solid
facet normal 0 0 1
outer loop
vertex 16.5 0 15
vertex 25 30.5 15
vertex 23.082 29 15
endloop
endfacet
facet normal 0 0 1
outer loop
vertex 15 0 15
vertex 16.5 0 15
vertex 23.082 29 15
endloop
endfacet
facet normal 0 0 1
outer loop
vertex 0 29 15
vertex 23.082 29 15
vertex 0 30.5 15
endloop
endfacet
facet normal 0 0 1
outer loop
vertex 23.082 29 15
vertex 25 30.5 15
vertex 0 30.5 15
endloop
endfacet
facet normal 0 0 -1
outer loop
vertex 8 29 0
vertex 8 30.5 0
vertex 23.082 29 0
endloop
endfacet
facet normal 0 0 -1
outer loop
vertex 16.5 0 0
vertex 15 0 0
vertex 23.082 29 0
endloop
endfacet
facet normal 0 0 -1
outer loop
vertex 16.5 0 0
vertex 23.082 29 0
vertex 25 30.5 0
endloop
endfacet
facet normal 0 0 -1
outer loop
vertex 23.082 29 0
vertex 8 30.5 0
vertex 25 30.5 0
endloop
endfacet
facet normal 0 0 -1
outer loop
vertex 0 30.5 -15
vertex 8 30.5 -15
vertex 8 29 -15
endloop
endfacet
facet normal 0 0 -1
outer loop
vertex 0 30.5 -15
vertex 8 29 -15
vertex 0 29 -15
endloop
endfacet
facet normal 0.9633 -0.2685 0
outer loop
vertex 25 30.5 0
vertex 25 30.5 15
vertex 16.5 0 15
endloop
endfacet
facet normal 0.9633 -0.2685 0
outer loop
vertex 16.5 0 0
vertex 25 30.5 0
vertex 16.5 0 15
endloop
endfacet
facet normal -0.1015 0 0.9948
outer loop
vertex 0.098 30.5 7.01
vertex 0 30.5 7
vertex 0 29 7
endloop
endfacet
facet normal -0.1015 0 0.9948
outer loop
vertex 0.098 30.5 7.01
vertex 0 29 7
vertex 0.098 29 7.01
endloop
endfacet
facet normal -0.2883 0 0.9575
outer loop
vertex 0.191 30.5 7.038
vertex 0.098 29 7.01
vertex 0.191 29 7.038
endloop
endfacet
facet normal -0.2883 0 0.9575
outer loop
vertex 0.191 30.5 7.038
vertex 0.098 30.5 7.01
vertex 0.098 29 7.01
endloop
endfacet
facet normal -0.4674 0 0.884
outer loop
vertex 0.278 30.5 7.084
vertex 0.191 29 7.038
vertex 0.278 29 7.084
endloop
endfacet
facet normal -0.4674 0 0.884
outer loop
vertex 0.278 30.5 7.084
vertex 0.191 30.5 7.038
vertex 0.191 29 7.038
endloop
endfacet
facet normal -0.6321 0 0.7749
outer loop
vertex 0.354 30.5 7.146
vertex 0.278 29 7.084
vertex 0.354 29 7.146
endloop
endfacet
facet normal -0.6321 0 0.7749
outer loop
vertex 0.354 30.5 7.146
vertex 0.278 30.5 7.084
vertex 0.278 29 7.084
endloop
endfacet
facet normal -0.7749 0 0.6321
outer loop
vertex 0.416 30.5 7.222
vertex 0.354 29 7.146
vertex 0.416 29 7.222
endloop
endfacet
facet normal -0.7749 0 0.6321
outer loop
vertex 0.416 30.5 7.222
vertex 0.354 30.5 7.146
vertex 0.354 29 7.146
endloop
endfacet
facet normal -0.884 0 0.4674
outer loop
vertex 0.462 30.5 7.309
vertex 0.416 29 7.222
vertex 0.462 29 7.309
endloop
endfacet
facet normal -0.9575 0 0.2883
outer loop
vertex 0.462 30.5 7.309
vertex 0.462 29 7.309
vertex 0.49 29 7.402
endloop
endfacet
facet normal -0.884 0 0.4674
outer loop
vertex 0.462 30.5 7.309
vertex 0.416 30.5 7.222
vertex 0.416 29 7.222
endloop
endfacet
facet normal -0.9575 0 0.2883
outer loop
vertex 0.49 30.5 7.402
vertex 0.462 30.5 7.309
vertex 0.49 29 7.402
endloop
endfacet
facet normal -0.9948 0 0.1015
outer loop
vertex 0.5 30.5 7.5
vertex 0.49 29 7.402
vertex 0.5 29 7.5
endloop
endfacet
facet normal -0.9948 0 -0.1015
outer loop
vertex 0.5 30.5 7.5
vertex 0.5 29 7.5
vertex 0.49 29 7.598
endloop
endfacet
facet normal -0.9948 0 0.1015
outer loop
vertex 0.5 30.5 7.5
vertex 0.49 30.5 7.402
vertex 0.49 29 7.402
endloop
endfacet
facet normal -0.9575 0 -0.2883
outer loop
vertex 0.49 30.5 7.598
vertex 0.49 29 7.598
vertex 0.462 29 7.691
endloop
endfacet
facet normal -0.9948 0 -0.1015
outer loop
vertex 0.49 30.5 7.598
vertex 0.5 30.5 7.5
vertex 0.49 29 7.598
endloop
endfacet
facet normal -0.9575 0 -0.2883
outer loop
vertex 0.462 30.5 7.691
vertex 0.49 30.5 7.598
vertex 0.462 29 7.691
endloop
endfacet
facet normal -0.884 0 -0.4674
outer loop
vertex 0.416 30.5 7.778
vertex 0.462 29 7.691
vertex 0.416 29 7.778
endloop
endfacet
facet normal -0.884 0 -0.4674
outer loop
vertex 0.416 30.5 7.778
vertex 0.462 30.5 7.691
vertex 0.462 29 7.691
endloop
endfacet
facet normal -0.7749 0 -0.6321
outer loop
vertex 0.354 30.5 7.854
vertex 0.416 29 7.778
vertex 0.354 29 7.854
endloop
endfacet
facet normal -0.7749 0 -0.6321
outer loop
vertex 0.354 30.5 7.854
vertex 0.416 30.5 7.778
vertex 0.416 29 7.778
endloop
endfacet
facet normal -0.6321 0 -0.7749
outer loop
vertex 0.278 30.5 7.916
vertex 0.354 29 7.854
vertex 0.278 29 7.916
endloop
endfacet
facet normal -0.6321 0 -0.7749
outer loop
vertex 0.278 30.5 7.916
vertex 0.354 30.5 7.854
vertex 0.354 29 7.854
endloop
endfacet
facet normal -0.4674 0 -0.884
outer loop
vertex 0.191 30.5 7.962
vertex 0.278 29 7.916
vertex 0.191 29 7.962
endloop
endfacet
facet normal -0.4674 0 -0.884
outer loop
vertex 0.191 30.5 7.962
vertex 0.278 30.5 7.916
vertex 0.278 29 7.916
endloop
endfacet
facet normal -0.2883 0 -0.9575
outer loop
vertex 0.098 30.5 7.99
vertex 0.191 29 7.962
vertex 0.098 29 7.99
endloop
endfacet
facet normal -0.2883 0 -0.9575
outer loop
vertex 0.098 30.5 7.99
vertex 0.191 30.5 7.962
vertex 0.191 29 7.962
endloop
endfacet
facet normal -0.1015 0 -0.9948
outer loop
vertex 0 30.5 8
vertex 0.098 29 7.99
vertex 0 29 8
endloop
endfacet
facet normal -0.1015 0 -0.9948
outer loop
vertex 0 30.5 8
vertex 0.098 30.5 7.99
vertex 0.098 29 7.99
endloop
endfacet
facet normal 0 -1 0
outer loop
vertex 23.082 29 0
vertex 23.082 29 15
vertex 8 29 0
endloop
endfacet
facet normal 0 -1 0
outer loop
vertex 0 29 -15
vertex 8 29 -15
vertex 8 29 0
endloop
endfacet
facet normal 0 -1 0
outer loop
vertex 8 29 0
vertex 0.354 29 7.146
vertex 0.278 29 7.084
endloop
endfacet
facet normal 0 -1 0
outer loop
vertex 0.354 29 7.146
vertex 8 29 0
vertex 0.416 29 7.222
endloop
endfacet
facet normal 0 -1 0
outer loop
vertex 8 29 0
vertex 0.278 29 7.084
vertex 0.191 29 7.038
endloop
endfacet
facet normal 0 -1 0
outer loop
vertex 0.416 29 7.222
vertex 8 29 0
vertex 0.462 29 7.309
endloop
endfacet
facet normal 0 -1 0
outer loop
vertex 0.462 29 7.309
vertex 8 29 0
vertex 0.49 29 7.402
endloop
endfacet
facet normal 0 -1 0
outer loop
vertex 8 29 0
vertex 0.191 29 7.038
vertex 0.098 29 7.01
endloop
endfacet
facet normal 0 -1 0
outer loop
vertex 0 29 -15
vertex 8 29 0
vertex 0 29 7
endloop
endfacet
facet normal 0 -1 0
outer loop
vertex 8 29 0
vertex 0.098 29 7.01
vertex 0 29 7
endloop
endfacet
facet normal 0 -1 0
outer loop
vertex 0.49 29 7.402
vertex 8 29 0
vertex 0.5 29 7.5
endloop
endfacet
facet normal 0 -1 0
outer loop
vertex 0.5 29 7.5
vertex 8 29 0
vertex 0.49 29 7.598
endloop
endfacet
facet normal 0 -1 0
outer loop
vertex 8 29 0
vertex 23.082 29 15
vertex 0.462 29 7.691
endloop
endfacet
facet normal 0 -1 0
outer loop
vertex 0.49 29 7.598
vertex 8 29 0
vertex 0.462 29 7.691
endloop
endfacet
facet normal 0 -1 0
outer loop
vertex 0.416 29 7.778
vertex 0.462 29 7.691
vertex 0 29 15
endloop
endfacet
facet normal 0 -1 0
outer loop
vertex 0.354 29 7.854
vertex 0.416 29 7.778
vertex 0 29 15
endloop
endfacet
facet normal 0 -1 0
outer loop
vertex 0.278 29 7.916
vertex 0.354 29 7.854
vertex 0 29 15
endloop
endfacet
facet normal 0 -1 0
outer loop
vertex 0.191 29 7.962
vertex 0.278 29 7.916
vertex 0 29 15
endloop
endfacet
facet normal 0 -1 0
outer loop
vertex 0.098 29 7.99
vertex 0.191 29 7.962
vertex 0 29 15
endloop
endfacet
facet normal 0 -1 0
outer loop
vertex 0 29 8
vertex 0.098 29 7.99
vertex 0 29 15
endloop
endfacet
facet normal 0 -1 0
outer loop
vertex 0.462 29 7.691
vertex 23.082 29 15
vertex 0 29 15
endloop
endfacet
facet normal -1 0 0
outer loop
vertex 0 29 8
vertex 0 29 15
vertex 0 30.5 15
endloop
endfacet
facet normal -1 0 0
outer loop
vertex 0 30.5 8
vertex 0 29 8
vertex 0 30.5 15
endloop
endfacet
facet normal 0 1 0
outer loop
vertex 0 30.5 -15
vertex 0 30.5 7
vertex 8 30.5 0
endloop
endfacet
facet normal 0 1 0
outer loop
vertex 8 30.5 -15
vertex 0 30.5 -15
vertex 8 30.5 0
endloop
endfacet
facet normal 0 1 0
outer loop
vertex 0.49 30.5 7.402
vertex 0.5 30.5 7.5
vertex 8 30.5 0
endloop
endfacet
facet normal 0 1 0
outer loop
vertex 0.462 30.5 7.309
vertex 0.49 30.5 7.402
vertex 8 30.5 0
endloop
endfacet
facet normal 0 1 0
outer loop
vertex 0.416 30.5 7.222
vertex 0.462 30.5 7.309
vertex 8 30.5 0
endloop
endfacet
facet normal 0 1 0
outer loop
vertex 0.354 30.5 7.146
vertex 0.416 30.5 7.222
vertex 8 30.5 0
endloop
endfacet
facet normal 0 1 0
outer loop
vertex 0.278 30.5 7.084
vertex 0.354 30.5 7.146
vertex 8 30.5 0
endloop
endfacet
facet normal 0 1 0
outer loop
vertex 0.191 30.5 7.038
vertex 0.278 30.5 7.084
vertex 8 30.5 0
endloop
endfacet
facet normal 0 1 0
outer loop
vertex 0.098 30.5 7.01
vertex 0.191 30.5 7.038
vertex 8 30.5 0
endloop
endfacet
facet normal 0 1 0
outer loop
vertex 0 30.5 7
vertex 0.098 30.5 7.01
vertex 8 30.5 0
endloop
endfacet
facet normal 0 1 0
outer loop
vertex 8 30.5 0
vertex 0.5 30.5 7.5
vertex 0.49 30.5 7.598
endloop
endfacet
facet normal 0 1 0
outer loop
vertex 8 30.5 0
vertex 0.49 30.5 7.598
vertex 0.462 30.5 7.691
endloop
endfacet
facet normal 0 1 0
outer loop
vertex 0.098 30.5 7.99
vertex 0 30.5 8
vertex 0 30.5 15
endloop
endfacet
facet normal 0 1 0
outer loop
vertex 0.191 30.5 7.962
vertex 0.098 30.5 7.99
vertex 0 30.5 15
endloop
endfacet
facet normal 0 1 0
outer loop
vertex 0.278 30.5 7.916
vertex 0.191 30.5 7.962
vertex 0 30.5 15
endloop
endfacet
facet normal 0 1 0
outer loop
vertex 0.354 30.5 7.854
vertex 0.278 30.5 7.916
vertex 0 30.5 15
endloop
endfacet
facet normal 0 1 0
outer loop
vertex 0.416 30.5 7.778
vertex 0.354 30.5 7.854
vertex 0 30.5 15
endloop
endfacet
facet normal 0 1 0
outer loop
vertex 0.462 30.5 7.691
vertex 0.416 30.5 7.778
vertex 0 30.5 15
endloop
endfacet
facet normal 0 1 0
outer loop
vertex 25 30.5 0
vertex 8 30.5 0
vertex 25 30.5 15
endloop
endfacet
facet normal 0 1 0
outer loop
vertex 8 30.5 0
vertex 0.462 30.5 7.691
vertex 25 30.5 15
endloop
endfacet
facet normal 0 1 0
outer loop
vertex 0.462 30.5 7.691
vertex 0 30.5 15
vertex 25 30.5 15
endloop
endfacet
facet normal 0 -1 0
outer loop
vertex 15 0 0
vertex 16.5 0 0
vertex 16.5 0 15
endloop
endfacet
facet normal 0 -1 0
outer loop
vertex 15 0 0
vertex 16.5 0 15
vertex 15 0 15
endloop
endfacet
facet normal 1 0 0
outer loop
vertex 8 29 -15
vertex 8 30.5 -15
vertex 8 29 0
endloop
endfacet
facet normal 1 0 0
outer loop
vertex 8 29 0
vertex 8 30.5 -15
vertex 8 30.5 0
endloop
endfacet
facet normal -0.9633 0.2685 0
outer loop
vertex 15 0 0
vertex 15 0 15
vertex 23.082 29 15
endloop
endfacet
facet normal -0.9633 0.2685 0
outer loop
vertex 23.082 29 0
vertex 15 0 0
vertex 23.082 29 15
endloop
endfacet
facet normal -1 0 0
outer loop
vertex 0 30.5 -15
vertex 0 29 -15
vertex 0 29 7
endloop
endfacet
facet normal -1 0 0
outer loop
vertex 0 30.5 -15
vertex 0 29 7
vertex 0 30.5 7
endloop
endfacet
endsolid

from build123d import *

# Parameters (mm, degrees)
SKETCH005_R      = 0.5
SKETCH005_W      = 18
SKETCH005_H      = 16
EXTRUDE005_DEPTH = 32
EXTRUDE003_DEPTH = 15


with BuildPart() as extrude005:
    # Sketch005 → Extrude005 (new body)
    with BuildSketch(Plane(origin=(0, 31, 0), x_dir=(-1, 0, 0), z_dir=(0, 1, 0))):
        with Locations((0, 7.5)):
            Circle(SKETCH005_R)
        with Locations((17, -8)):
            Rectangle(SKETCH005_W, SKETCH005_H)
    extrude(amount=-EXTRUDE005_DEPTH)


with BuildPart() as body003:
    # Sketch003 → Extrude003 (new body, symmetric)
    with BuildSketch(Plane.XY):
        Polygon((-15, 0), (-23.081967, 29), (0, 29), (0, 30.5), (-25, 30.5), (-16.5, 0), align=None)
    extrude(amount=EXTRUDE003_DEPTH, both=True)

    # Cut001: cut Extrude005
    add(extrude005.part, mode=Mode.SUBTRACT)


with BuildPart() as part_mirroring001:
    # Part__Mirroring001: instance of Body003
    add(body003.part.mirror(Plane(origin=(0, 0, 0), x_dir=(0, -1, 0), z_dir=(1, 0, 0))))


solid = part_mirroring001.part
